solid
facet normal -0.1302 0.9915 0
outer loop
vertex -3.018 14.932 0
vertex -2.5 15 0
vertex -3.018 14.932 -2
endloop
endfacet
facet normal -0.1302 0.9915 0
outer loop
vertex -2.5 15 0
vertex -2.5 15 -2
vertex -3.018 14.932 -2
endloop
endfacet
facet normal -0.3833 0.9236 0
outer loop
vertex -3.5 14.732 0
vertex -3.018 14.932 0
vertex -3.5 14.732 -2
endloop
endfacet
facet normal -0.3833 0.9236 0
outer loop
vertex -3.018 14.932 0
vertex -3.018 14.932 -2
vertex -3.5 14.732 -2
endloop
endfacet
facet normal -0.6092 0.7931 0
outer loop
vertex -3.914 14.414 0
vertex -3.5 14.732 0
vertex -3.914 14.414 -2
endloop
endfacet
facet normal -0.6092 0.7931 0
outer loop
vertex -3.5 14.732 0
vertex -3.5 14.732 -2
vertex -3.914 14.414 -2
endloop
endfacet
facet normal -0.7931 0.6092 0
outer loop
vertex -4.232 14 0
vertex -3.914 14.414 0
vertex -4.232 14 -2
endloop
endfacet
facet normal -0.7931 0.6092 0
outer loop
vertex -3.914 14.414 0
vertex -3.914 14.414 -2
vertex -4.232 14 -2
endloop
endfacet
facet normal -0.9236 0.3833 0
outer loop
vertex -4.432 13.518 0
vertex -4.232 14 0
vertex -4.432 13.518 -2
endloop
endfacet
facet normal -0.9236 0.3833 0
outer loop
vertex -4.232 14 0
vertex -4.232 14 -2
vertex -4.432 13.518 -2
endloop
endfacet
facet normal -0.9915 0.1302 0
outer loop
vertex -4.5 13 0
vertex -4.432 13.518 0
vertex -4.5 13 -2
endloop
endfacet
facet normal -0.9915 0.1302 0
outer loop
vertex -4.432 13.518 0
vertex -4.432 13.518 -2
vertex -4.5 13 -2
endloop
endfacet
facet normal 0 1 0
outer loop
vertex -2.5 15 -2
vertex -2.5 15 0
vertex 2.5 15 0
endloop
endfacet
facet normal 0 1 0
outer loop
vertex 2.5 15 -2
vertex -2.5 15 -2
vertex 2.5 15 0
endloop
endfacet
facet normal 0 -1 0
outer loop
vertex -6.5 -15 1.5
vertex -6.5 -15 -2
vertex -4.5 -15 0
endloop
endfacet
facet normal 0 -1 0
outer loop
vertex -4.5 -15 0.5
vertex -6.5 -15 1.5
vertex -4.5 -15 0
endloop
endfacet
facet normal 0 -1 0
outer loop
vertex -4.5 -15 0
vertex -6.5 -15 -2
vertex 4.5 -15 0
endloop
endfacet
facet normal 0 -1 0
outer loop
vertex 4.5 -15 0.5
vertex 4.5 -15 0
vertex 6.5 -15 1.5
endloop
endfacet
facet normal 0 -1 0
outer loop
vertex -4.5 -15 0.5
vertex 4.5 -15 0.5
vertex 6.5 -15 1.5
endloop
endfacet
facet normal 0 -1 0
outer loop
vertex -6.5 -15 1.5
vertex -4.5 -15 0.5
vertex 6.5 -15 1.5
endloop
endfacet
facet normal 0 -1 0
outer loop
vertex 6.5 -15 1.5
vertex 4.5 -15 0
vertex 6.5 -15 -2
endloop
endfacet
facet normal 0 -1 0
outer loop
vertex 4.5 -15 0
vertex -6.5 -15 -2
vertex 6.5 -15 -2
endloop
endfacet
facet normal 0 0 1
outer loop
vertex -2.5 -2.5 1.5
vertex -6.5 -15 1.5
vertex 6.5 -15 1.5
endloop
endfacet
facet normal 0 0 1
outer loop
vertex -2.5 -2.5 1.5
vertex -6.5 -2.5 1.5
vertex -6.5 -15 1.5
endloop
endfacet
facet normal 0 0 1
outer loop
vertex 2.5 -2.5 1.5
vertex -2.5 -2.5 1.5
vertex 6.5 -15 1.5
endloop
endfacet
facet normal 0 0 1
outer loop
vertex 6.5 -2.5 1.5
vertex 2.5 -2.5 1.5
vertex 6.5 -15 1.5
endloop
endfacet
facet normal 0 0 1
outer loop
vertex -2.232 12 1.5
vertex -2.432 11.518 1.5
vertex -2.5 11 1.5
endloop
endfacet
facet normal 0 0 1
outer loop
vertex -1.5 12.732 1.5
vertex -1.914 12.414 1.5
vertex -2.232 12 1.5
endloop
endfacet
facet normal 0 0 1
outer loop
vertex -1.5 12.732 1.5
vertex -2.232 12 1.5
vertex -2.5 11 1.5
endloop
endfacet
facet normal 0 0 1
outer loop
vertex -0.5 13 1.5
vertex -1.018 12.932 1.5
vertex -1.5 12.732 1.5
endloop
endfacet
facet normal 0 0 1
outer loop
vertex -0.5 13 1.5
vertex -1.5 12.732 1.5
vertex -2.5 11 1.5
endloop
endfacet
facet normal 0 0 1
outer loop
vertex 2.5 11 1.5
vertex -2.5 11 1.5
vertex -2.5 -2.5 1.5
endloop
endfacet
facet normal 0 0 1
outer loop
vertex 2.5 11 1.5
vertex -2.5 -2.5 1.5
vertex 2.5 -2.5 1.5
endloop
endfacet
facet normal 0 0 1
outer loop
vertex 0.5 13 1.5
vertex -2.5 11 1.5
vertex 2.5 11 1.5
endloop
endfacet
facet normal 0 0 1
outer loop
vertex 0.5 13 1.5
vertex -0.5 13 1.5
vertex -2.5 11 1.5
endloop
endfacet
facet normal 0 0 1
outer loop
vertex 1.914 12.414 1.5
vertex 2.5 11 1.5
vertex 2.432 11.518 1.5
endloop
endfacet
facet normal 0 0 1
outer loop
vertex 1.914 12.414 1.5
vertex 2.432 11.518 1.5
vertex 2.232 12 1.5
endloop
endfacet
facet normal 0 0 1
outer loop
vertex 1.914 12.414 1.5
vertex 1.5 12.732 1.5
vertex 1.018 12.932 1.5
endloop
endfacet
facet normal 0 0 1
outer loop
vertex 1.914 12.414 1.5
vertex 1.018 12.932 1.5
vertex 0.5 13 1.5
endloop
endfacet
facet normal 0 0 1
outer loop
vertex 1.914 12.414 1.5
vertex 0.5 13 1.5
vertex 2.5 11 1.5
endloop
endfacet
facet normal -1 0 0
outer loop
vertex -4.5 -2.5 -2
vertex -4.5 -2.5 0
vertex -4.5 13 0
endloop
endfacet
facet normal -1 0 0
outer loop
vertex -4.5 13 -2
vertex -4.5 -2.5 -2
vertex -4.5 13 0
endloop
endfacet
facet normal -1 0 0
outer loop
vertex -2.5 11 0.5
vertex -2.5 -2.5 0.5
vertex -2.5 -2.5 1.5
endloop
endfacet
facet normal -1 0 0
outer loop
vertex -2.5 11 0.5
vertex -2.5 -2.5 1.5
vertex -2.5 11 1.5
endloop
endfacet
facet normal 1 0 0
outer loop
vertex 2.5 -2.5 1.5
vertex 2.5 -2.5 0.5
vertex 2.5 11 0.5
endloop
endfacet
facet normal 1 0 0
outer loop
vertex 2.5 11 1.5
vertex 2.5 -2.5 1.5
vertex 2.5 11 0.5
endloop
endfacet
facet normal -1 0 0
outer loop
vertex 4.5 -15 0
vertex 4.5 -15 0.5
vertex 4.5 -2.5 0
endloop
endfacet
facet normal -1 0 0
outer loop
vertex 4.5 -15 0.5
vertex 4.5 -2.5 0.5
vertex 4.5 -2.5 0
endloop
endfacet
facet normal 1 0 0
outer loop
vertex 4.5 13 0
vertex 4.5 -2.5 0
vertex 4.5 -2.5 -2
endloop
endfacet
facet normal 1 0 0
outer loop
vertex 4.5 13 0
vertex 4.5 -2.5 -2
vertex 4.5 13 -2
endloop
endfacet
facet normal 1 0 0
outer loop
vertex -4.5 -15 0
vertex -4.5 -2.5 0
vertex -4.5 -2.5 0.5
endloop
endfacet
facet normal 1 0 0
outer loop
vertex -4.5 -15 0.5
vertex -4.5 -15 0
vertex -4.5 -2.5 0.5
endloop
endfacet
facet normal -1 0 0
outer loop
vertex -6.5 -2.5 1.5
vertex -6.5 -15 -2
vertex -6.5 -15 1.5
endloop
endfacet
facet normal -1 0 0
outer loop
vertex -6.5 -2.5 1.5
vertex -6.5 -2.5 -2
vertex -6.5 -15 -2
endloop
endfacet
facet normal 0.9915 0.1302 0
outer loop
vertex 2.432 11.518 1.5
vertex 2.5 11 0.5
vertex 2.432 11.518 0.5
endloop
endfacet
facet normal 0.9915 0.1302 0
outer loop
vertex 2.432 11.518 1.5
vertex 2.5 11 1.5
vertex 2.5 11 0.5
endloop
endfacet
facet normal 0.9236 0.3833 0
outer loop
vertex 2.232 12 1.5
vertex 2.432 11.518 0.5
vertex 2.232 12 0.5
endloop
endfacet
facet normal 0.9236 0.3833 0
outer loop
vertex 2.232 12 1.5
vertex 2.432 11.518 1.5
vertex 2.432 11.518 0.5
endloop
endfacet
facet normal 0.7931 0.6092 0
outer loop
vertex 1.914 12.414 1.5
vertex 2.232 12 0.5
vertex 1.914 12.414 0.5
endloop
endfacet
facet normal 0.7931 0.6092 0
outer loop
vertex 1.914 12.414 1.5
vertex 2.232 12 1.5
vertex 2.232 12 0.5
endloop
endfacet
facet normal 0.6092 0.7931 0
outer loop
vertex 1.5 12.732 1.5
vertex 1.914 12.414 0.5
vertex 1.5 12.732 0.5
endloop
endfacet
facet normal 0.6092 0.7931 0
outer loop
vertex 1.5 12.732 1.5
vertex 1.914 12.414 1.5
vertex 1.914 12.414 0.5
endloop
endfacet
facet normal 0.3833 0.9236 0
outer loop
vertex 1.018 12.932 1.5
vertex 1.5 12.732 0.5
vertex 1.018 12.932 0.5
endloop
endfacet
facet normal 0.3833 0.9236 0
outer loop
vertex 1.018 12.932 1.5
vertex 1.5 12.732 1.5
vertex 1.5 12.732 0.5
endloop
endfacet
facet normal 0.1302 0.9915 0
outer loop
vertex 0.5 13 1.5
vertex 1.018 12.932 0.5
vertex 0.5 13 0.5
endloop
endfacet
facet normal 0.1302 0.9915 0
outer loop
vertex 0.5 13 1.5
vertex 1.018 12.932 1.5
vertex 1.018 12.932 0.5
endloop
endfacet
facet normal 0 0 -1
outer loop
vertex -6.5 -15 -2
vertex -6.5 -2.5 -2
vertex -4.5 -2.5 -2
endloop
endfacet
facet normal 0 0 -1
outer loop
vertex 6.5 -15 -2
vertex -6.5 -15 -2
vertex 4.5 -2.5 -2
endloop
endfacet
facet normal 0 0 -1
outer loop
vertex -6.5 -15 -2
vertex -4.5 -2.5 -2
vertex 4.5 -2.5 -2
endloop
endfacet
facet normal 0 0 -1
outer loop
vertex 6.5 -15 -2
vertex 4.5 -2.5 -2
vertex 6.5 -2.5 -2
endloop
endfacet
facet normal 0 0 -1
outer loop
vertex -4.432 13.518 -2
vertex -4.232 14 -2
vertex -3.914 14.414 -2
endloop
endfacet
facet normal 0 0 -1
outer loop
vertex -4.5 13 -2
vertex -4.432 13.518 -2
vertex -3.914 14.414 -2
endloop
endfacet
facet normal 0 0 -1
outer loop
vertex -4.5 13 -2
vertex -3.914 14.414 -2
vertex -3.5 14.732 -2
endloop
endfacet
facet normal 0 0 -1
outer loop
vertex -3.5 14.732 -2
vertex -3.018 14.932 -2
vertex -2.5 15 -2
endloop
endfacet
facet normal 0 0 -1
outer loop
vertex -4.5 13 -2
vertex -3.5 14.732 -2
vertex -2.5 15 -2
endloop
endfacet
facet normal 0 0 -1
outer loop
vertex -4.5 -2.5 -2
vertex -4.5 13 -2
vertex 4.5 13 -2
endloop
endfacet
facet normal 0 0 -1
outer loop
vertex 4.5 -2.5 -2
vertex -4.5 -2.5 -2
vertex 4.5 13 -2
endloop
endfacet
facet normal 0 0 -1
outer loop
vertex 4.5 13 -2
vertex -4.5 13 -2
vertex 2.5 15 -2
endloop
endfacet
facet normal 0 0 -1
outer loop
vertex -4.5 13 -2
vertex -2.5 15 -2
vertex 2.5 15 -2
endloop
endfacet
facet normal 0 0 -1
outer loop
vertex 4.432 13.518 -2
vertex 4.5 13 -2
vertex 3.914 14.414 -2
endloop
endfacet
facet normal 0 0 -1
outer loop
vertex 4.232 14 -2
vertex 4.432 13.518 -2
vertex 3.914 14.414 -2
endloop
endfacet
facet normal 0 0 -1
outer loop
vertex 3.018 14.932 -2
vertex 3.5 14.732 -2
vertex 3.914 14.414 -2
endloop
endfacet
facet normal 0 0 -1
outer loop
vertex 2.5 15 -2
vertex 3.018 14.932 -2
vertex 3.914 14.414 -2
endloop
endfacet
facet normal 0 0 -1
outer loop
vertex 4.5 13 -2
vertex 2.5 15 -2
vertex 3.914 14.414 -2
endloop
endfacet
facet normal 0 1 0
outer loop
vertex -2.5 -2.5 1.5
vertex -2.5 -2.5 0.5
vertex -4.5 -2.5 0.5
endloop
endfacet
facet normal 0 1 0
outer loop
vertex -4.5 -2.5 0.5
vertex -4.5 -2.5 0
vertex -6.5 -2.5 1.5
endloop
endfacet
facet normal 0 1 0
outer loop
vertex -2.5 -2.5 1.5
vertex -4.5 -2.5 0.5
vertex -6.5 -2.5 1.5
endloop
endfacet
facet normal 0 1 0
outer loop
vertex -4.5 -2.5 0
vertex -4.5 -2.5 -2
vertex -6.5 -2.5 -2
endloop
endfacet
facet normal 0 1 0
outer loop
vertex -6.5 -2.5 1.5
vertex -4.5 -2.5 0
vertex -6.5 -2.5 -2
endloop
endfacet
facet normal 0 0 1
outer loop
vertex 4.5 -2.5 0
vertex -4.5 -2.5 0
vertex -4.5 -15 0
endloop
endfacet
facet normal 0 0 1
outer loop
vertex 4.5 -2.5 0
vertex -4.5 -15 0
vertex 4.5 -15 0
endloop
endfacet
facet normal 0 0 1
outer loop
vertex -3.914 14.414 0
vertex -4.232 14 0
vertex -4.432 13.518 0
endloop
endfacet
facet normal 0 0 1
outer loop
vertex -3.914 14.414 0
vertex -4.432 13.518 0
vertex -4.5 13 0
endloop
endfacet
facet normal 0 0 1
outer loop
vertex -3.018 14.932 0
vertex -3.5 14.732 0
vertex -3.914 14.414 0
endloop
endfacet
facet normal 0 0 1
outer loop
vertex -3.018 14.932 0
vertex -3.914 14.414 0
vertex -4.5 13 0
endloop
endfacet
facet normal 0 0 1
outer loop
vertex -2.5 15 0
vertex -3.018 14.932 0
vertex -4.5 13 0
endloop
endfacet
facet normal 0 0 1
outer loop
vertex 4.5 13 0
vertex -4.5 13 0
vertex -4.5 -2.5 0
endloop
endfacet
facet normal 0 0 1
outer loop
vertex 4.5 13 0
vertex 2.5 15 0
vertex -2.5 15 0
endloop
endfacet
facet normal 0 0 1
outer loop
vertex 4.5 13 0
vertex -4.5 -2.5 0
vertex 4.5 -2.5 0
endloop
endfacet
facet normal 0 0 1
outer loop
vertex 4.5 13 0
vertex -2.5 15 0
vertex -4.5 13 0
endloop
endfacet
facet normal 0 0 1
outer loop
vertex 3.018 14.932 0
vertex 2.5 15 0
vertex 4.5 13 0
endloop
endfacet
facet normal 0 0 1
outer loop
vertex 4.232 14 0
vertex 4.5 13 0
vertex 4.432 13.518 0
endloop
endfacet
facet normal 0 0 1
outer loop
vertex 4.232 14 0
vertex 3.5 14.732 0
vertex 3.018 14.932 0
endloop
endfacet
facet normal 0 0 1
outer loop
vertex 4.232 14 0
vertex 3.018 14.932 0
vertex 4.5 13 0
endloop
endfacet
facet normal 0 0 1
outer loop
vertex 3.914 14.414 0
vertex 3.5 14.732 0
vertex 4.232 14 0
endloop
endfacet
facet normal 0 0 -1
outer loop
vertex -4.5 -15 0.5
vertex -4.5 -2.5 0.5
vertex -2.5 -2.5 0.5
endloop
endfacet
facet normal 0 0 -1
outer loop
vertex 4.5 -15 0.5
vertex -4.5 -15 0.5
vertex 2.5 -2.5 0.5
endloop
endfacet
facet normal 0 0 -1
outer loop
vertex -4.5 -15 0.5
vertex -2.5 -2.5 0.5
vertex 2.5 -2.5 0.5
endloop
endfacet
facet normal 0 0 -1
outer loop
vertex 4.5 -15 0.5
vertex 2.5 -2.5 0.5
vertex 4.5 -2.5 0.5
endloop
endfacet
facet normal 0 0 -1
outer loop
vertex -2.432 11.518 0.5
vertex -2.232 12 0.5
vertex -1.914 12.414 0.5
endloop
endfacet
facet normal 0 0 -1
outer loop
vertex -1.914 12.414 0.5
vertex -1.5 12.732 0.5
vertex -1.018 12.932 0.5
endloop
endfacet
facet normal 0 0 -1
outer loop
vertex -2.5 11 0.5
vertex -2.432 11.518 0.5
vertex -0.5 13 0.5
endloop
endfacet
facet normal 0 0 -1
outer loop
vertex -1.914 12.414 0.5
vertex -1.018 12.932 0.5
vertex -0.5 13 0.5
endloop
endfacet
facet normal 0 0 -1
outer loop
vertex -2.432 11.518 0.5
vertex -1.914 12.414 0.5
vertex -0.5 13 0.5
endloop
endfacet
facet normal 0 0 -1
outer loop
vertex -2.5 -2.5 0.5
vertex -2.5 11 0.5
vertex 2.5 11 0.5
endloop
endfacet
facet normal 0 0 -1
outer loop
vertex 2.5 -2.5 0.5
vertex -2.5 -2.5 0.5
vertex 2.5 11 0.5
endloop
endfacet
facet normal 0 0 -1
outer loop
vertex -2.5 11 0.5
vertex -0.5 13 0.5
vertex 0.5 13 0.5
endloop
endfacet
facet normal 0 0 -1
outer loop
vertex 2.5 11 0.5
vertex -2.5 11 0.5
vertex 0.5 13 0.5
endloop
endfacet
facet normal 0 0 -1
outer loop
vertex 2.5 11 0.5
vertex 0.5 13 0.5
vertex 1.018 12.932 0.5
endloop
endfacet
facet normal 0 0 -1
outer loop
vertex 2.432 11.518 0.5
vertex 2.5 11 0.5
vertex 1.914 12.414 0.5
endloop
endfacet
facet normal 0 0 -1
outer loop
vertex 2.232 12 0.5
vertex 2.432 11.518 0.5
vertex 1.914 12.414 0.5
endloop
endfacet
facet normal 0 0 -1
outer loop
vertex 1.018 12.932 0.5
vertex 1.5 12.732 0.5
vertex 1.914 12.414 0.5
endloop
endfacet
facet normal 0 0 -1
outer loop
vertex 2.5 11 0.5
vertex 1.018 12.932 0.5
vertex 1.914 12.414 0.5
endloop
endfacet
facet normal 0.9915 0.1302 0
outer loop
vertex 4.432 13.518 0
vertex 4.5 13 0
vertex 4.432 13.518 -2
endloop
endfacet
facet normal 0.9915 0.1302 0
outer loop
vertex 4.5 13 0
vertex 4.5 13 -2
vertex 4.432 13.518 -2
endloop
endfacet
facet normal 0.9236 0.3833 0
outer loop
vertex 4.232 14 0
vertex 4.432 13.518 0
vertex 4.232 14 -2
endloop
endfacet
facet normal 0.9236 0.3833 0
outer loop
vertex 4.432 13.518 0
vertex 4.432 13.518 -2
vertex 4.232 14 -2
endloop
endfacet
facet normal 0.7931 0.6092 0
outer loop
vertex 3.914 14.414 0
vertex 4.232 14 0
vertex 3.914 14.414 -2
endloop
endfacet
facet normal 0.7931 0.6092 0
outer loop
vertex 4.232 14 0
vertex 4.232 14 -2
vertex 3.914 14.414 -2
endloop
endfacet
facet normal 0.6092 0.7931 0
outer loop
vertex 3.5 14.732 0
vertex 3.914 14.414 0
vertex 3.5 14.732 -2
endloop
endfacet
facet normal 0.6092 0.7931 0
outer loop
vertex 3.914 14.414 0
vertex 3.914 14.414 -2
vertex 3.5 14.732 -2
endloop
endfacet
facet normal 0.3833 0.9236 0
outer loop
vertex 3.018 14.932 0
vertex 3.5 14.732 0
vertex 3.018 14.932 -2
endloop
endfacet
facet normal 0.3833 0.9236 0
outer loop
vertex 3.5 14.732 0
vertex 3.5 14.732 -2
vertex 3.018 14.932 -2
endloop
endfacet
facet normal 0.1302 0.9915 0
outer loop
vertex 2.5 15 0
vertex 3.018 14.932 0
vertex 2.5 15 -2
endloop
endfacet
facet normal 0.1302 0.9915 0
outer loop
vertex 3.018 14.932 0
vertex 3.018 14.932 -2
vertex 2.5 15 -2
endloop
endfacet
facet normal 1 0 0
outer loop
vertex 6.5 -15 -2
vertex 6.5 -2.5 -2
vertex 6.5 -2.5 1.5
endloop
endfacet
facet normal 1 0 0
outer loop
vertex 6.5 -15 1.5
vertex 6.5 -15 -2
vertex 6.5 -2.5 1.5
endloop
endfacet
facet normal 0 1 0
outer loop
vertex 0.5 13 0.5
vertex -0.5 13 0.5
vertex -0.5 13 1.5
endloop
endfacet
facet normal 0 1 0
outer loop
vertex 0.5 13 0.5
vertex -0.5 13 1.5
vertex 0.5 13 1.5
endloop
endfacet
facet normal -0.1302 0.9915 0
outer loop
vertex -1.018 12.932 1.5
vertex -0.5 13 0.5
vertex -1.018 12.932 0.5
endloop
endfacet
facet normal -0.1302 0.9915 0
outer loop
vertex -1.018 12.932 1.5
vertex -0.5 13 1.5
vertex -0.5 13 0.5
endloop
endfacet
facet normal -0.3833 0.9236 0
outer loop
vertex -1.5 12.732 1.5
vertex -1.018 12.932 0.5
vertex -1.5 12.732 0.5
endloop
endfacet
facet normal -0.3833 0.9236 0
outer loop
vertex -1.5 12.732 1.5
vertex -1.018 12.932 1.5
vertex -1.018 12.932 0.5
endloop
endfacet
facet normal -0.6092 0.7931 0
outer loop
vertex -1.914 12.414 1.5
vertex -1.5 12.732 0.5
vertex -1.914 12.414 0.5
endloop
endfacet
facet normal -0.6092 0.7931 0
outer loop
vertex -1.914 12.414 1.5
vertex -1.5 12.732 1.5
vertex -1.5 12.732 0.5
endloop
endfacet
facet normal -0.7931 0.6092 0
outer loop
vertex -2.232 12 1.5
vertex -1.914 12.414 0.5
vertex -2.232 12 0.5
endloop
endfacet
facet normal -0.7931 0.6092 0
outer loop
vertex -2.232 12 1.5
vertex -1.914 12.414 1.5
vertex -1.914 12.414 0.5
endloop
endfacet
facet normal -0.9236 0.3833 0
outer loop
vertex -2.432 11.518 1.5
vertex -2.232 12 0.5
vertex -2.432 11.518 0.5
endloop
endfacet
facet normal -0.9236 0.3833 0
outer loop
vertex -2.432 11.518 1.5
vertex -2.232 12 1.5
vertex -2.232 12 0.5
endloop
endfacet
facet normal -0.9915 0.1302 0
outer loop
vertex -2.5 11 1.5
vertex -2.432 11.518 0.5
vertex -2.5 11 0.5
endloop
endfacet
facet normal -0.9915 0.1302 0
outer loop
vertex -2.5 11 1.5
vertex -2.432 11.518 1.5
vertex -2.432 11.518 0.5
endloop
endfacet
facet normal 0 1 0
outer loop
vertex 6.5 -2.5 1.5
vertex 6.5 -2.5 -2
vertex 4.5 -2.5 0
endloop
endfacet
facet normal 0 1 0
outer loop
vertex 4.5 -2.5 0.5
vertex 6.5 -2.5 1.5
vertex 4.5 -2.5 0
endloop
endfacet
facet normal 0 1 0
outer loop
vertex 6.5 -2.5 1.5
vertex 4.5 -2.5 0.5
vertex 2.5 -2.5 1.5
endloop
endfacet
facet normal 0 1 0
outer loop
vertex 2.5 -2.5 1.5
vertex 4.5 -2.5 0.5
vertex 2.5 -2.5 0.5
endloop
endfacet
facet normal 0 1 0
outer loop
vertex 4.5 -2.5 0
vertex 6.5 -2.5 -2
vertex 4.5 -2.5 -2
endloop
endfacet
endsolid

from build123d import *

# Parameters (mm, degrees)
F0_W     = 2
F0_H     = 10
F0_W_2   = 9
F0_H_2   = 2.5
F0_H_3   = 15
F1_DEPTH = 2
F2_DEPTH = 0.5
F3_W     = 2
F3_H     = 10
F3_W_2   = 5
F3_H_2   = 15.5
F4_DEPTH = 1
F5_R     = 2
F6_DEPTH = 25
F7_DEPTH = 2.5


# Not quite as in the source:
# - a feature names something its author has since deleted; it is built from what else it names


with BuildPart() as f1:
    # F0 (on Top) → F1 (new body)
    with BuildSketch(Plane.XY):
        with Locations((-5.5, -7.5)):
            Rectangle(F0_W, F0_H)
        with Locations((0, 13.75)):
            Rectangle(F0_W_2, F0_H_2)
        Polygon((4.5, -2.5), (4.5, 12.5), (-4.5, 12.5), (-4.5, -2.5), (-4.5, -12.5), (4.5, -12.5), align=None)
        with Locations((0, -13.75)):
            Rectangle(F0_W_2, F0_H_2)
        with Locations((5.5, -7.5)):
            Rectangle(F0_W, F0_H)
        with Locations((-5.5, 5)):
            Rectangle(F0_W, F0_H_3)
        with Locations((5.5, 5)):
            Rectangle(F0_W, F0_H_3)
    extrude(amount=-F1_DEPTH)

    # F0 (on Top) → F2 (join)
    with BuildSketch(Plane.XY):
        with Locations((-5.5, -7.5)):
            Rectangle(F0_W, F0_H)
        with Locations((5.5, -7.5)):
            Rectangle(F0_W, F0_H)
    extrude(amount=F2_DEPTH)

    # F3 (on face) → F4 (join)
    with BuildSketch(Plane.XY.offset(0.5)):
        with Locations((-5.5, -7.5)):
            Rectangle(F3_W, F3_H)
        Polygon((-4.5, -2.5), (-4.5, -12.5), (6.5, -12.5), (6.5, -2.5), (4.5, -2.5), (2.5, -2.5), (-2.5, -2.5), align=None)
        with Locations((0, 5.25)):
            Rectangle(F3_W_2, F3_H_2)
    extrude(amount=F4_DEPTH)

    # F5
    f5_edges = [f1.edges().sort_by_distance(p)[0] for p in [
        (-4.5, 15, -1),
        (4.5, 15, -1),
        (-2.5, 13, 1),
        (2.5, 13, 1),
    ]]
    fillet(f5_edges, radius=F5_R)

    # F0 (on Top) → F6 (cut)
    with BuildSketch(Plane.XY):
        with Locations((-5.5, 5)):
            Rectangle(F0_W, F0_H_3)
        with Locations((5.5, 5)):
            Rectangle(F0_W, F0_H_3)
    extrude(amount=-F6_DEPTH, mode=Mode.SUBTRACT)

    # F7 (add, through all): a face of the model
    f7_faces = [f1.faces().sort_by_distance(p)[0] for p in [
        (-5.5, -12.5, -1.8653708798),
    ]]
    extrude(f7_faces, amount=F7_DEPTH)


solid = f1.part
